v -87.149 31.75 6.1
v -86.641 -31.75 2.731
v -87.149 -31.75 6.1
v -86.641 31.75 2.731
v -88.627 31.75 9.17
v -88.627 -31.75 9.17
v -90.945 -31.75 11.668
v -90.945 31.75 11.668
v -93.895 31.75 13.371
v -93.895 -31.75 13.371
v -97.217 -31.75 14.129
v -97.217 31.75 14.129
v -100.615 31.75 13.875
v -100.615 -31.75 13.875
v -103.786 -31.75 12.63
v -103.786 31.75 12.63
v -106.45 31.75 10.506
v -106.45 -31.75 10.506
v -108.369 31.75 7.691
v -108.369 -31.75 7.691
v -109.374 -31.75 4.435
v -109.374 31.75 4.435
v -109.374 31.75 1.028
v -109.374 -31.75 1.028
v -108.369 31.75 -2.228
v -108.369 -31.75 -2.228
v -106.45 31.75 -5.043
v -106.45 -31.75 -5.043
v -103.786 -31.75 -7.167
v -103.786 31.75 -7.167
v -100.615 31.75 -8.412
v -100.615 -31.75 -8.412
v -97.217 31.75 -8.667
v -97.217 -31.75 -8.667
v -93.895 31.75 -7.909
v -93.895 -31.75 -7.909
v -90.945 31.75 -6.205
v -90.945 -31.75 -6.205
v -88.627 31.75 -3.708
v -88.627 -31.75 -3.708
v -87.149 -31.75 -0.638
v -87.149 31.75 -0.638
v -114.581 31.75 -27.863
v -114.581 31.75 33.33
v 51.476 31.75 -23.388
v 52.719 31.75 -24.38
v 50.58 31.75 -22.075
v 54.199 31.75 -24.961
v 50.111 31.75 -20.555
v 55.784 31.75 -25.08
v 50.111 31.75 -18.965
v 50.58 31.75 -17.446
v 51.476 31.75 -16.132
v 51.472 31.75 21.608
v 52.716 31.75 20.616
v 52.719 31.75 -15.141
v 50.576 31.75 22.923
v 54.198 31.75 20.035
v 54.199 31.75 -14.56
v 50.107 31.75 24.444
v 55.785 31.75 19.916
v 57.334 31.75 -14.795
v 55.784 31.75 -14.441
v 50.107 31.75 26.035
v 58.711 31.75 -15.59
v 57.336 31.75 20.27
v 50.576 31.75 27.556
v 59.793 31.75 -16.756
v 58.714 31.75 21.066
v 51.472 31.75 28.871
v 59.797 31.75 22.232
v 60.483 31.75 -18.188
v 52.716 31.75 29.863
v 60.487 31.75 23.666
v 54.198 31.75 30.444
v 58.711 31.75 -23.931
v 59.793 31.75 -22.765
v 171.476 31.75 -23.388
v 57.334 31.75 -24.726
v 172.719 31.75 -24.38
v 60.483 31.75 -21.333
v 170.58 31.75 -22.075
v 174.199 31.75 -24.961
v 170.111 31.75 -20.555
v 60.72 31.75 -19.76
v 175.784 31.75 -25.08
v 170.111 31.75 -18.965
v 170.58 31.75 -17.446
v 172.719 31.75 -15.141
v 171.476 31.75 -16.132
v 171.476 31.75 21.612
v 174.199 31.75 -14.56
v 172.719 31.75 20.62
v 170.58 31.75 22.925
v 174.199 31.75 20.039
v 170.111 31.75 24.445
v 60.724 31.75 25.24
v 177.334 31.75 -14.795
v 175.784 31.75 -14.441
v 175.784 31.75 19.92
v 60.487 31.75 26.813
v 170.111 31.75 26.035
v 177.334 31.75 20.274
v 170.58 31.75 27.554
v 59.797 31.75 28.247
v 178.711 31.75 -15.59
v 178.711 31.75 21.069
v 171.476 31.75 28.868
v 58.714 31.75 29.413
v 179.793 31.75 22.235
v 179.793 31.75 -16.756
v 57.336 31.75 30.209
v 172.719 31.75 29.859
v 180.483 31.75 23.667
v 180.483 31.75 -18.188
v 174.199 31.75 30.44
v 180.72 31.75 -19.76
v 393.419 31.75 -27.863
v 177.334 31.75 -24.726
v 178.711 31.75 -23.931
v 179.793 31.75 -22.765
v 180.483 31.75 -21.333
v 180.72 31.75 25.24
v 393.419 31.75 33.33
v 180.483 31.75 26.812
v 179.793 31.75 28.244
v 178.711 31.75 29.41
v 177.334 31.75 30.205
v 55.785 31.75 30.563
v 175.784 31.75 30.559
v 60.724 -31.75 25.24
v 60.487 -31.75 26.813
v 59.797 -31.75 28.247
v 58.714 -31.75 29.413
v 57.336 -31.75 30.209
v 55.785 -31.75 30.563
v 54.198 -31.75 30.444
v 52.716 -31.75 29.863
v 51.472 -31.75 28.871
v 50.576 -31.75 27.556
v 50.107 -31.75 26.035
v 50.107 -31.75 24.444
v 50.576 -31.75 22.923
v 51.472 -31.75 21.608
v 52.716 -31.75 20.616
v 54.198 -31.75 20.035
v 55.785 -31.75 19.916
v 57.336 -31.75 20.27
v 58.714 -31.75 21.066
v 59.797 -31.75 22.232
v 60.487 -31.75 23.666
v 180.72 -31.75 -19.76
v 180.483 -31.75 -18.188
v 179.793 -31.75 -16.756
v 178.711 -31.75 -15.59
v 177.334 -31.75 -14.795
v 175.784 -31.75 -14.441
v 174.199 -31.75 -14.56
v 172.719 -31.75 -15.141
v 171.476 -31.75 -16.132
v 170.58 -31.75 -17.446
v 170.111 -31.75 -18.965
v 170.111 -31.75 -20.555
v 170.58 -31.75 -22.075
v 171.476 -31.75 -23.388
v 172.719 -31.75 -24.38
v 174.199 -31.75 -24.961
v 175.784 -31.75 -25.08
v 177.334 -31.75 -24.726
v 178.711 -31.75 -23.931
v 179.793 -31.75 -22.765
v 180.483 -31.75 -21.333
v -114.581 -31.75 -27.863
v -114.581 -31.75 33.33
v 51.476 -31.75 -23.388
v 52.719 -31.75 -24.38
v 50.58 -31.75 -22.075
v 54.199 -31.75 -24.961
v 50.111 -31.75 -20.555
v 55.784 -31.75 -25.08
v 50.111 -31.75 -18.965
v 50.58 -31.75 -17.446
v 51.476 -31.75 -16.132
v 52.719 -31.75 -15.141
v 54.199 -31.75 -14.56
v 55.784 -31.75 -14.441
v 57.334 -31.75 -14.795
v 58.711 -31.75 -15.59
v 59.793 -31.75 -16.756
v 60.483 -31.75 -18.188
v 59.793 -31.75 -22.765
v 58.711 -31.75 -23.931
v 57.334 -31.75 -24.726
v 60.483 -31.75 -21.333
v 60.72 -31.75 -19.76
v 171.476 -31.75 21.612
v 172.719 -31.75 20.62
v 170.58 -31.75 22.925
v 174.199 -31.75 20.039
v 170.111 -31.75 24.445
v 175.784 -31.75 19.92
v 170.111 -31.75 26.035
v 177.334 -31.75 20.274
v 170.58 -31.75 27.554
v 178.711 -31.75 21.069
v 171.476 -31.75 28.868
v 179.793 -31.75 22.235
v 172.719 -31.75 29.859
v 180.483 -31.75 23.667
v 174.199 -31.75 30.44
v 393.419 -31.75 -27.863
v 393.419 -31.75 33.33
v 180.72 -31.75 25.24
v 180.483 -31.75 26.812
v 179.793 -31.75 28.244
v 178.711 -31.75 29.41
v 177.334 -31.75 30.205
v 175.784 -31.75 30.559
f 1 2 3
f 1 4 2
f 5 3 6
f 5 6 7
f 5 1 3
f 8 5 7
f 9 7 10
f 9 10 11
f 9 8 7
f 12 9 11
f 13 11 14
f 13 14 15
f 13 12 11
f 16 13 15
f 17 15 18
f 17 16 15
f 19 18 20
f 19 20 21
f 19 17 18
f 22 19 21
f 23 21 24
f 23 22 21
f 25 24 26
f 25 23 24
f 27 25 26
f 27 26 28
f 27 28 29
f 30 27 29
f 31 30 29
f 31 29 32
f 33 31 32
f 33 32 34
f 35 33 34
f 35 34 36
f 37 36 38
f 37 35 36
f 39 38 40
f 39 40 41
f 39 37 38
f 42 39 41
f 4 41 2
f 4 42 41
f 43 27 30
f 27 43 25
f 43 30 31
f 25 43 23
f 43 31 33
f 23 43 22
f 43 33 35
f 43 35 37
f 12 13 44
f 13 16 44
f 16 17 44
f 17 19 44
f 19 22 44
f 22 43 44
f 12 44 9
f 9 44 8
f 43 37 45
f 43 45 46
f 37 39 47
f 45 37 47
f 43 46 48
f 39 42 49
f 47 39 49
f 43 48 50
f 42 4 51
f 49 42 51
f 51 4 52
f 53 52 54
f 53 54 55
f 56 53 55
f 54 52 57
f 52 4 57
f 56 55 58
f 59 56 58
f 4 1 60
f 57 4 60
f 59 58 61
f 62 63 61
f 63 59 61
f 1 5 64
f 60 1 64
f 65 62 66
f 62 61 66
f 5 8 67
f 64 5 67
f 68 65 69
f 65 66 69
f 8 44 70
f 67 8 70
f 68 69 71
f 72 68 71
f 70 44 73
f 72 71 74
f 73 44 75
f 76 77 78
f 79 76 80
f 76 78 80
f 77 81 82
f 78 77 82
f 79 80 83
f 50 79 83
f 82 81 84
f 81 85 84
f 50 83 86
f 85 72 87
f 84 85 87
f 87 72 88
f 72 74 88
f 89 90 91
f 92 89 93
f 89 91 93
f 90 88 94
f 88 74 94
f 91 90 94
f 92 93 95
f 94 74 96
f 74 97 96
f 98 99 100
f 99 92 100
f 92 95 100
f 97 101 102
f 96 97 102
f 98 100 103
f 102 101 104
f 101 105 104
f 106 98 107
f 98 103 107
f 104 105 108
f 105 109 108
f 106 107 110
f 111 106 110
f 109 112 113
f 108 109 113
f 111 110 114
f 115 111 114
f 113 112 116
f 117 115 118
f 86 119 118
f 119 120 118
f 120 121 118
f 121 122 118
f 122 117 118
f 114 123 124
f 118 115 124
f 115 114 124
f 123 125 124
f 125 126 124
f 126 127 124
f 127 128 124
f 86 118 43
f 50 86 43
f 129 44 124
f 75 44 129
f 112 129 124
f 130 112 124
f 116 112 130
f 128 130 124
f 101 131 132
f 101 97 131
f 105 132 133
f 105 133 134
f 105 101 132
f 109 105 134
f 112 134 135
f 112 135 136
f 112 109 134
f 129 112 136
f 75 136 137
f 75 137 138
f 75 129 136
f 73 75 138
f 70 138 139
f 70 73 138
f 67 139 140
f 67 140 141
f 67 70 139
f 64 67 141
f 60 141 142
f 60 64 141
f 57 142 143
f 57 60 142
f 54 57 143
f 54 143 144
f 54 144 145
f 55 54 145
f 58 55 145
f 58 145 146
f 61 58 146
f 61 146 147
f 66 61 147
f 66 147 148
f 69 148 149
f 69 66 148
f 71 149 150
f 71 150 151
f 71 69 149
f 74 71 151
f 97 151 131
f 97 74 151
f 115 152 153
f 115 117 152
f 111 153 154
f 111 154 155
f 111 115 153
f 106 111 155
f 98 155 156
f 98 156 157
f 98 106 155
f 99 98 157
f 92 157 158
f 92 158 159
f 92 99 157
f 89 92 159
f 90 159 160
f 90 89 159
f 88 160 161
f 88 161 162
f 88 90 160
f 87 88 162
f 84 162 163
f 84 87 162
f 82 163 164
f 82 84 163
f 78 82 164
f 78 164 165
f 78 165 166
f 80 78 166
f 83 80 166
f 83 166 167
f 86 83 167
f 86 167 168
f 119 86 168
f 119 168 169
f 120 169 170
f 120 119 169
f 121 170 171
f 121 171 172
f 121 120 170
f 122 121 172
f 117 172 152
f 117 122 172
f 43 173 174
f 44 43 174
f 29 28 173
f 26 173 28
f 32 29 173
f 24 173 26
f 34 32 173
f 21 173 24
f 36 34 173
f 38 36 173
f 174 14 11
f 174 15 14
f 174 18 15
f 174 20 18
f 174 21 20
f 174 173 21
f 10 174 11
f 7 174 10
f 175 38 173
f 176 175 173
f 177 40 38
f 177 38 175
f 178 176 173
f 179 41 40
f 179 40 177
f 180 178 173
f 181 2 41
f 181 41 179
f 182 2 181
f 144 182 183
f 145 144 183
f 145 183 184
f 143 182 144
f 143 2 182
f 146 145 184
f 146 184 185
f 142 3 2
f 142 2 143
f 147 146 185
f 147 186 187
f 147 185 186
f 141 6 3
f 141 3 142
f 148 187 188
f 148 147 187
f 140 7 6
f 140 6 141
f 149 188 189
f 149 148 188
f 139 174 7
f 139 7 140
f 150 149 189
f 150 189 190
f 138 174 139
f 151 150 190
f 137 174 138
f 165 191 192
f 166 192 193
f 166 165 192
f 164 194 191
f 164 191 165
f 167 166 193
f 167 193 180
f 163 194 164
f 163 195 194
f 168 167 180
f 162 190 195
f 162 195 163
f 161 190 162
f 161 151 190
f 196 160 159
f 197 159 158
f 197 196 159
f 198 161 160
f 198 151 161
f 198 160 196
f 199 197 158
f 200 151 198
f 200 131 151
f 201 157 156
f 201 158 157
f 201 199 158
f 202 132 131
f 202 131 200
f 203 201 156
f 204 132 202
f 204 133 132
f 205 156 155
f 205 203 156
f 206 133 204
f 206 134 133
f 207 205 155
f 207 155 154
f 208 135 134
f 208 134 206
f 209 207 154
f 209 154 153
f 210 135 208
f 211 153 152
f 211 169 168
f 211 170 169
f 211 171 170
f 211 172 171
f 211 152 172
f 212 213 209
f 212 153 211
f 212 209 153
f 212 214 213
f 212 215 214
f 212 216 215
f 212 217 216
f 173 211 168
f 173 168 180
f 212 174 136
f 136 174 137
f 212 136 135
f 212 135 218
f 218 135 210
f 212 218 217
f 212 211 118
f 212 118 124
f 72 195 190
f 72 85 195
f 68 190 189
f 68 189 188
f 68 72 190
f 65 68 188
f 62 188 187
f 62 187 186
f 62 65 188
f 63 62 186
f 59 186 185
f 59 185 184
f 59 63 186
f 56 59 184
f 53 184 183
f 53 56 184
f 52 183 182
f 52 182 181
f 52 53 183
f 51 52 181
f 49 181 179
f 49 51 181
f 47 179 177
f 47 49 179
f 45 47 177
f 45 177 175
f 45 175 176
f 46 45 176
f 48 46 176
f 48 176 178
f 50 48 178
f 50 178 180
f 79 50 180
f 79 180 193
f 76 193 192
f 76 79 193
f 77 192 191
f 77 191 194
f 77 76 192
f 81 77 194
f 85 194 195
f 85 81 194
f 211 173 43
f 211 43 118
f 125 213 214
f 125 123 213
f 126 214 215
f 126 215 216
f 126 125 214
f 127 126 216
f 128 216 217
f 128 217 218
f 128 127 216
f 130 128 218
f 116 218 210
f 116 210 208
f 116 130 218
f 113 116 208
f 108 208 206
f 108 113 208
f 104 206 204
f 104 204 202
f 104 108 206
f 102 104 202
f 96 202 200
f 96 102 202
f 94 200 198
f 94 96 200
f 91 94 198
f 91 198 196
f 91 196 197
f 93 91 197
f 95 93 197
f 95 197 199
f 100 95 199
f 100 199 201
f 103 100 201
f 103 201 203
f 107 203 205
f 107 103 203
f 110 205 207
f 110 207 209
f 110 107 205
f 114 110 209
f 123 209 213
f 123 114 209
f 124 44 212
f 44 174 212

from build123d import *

# Parameters (mm, degrees)
F0_W     = 508
F0_H     = 61.19313
F0_R     = 5.334
F0_R_2   = 11.43
F0_R_3   = 5.338674
F1_DEPTH = 31.75


with BuildPart() as f1:
    # F0 (on Front) → F1 (new body, symmetric)
    with BuildSketch(Plane.XZ):
        with Locations((139.418788, 2.733509)):
            Rectangle(F0_W, F0_H)
        with Locations((55.385654, -19.760456)):
            Circle(F0_R, mode=Mode.SUBTRACT)
        with Locations((-98.071212, 2.731244)):
            Circle(F0_R_2, mode=Mode.SUBTRACT)
        with Locations((175.385654, -19.760456)):
            Circle(F0_R, mode=Mode.SUBTRACT)
        with Locations((55.385654, 25.239544)):
            Circle(F0_R_3, mode=Mode.SUBTRACT)
        with Locations((175.385654, 25.239544)):
            Circle(F0_R, mode=Mode.SUBTRACT)
    extrude(amount=F1_DEPTH, both=True)


solid = f1.part
